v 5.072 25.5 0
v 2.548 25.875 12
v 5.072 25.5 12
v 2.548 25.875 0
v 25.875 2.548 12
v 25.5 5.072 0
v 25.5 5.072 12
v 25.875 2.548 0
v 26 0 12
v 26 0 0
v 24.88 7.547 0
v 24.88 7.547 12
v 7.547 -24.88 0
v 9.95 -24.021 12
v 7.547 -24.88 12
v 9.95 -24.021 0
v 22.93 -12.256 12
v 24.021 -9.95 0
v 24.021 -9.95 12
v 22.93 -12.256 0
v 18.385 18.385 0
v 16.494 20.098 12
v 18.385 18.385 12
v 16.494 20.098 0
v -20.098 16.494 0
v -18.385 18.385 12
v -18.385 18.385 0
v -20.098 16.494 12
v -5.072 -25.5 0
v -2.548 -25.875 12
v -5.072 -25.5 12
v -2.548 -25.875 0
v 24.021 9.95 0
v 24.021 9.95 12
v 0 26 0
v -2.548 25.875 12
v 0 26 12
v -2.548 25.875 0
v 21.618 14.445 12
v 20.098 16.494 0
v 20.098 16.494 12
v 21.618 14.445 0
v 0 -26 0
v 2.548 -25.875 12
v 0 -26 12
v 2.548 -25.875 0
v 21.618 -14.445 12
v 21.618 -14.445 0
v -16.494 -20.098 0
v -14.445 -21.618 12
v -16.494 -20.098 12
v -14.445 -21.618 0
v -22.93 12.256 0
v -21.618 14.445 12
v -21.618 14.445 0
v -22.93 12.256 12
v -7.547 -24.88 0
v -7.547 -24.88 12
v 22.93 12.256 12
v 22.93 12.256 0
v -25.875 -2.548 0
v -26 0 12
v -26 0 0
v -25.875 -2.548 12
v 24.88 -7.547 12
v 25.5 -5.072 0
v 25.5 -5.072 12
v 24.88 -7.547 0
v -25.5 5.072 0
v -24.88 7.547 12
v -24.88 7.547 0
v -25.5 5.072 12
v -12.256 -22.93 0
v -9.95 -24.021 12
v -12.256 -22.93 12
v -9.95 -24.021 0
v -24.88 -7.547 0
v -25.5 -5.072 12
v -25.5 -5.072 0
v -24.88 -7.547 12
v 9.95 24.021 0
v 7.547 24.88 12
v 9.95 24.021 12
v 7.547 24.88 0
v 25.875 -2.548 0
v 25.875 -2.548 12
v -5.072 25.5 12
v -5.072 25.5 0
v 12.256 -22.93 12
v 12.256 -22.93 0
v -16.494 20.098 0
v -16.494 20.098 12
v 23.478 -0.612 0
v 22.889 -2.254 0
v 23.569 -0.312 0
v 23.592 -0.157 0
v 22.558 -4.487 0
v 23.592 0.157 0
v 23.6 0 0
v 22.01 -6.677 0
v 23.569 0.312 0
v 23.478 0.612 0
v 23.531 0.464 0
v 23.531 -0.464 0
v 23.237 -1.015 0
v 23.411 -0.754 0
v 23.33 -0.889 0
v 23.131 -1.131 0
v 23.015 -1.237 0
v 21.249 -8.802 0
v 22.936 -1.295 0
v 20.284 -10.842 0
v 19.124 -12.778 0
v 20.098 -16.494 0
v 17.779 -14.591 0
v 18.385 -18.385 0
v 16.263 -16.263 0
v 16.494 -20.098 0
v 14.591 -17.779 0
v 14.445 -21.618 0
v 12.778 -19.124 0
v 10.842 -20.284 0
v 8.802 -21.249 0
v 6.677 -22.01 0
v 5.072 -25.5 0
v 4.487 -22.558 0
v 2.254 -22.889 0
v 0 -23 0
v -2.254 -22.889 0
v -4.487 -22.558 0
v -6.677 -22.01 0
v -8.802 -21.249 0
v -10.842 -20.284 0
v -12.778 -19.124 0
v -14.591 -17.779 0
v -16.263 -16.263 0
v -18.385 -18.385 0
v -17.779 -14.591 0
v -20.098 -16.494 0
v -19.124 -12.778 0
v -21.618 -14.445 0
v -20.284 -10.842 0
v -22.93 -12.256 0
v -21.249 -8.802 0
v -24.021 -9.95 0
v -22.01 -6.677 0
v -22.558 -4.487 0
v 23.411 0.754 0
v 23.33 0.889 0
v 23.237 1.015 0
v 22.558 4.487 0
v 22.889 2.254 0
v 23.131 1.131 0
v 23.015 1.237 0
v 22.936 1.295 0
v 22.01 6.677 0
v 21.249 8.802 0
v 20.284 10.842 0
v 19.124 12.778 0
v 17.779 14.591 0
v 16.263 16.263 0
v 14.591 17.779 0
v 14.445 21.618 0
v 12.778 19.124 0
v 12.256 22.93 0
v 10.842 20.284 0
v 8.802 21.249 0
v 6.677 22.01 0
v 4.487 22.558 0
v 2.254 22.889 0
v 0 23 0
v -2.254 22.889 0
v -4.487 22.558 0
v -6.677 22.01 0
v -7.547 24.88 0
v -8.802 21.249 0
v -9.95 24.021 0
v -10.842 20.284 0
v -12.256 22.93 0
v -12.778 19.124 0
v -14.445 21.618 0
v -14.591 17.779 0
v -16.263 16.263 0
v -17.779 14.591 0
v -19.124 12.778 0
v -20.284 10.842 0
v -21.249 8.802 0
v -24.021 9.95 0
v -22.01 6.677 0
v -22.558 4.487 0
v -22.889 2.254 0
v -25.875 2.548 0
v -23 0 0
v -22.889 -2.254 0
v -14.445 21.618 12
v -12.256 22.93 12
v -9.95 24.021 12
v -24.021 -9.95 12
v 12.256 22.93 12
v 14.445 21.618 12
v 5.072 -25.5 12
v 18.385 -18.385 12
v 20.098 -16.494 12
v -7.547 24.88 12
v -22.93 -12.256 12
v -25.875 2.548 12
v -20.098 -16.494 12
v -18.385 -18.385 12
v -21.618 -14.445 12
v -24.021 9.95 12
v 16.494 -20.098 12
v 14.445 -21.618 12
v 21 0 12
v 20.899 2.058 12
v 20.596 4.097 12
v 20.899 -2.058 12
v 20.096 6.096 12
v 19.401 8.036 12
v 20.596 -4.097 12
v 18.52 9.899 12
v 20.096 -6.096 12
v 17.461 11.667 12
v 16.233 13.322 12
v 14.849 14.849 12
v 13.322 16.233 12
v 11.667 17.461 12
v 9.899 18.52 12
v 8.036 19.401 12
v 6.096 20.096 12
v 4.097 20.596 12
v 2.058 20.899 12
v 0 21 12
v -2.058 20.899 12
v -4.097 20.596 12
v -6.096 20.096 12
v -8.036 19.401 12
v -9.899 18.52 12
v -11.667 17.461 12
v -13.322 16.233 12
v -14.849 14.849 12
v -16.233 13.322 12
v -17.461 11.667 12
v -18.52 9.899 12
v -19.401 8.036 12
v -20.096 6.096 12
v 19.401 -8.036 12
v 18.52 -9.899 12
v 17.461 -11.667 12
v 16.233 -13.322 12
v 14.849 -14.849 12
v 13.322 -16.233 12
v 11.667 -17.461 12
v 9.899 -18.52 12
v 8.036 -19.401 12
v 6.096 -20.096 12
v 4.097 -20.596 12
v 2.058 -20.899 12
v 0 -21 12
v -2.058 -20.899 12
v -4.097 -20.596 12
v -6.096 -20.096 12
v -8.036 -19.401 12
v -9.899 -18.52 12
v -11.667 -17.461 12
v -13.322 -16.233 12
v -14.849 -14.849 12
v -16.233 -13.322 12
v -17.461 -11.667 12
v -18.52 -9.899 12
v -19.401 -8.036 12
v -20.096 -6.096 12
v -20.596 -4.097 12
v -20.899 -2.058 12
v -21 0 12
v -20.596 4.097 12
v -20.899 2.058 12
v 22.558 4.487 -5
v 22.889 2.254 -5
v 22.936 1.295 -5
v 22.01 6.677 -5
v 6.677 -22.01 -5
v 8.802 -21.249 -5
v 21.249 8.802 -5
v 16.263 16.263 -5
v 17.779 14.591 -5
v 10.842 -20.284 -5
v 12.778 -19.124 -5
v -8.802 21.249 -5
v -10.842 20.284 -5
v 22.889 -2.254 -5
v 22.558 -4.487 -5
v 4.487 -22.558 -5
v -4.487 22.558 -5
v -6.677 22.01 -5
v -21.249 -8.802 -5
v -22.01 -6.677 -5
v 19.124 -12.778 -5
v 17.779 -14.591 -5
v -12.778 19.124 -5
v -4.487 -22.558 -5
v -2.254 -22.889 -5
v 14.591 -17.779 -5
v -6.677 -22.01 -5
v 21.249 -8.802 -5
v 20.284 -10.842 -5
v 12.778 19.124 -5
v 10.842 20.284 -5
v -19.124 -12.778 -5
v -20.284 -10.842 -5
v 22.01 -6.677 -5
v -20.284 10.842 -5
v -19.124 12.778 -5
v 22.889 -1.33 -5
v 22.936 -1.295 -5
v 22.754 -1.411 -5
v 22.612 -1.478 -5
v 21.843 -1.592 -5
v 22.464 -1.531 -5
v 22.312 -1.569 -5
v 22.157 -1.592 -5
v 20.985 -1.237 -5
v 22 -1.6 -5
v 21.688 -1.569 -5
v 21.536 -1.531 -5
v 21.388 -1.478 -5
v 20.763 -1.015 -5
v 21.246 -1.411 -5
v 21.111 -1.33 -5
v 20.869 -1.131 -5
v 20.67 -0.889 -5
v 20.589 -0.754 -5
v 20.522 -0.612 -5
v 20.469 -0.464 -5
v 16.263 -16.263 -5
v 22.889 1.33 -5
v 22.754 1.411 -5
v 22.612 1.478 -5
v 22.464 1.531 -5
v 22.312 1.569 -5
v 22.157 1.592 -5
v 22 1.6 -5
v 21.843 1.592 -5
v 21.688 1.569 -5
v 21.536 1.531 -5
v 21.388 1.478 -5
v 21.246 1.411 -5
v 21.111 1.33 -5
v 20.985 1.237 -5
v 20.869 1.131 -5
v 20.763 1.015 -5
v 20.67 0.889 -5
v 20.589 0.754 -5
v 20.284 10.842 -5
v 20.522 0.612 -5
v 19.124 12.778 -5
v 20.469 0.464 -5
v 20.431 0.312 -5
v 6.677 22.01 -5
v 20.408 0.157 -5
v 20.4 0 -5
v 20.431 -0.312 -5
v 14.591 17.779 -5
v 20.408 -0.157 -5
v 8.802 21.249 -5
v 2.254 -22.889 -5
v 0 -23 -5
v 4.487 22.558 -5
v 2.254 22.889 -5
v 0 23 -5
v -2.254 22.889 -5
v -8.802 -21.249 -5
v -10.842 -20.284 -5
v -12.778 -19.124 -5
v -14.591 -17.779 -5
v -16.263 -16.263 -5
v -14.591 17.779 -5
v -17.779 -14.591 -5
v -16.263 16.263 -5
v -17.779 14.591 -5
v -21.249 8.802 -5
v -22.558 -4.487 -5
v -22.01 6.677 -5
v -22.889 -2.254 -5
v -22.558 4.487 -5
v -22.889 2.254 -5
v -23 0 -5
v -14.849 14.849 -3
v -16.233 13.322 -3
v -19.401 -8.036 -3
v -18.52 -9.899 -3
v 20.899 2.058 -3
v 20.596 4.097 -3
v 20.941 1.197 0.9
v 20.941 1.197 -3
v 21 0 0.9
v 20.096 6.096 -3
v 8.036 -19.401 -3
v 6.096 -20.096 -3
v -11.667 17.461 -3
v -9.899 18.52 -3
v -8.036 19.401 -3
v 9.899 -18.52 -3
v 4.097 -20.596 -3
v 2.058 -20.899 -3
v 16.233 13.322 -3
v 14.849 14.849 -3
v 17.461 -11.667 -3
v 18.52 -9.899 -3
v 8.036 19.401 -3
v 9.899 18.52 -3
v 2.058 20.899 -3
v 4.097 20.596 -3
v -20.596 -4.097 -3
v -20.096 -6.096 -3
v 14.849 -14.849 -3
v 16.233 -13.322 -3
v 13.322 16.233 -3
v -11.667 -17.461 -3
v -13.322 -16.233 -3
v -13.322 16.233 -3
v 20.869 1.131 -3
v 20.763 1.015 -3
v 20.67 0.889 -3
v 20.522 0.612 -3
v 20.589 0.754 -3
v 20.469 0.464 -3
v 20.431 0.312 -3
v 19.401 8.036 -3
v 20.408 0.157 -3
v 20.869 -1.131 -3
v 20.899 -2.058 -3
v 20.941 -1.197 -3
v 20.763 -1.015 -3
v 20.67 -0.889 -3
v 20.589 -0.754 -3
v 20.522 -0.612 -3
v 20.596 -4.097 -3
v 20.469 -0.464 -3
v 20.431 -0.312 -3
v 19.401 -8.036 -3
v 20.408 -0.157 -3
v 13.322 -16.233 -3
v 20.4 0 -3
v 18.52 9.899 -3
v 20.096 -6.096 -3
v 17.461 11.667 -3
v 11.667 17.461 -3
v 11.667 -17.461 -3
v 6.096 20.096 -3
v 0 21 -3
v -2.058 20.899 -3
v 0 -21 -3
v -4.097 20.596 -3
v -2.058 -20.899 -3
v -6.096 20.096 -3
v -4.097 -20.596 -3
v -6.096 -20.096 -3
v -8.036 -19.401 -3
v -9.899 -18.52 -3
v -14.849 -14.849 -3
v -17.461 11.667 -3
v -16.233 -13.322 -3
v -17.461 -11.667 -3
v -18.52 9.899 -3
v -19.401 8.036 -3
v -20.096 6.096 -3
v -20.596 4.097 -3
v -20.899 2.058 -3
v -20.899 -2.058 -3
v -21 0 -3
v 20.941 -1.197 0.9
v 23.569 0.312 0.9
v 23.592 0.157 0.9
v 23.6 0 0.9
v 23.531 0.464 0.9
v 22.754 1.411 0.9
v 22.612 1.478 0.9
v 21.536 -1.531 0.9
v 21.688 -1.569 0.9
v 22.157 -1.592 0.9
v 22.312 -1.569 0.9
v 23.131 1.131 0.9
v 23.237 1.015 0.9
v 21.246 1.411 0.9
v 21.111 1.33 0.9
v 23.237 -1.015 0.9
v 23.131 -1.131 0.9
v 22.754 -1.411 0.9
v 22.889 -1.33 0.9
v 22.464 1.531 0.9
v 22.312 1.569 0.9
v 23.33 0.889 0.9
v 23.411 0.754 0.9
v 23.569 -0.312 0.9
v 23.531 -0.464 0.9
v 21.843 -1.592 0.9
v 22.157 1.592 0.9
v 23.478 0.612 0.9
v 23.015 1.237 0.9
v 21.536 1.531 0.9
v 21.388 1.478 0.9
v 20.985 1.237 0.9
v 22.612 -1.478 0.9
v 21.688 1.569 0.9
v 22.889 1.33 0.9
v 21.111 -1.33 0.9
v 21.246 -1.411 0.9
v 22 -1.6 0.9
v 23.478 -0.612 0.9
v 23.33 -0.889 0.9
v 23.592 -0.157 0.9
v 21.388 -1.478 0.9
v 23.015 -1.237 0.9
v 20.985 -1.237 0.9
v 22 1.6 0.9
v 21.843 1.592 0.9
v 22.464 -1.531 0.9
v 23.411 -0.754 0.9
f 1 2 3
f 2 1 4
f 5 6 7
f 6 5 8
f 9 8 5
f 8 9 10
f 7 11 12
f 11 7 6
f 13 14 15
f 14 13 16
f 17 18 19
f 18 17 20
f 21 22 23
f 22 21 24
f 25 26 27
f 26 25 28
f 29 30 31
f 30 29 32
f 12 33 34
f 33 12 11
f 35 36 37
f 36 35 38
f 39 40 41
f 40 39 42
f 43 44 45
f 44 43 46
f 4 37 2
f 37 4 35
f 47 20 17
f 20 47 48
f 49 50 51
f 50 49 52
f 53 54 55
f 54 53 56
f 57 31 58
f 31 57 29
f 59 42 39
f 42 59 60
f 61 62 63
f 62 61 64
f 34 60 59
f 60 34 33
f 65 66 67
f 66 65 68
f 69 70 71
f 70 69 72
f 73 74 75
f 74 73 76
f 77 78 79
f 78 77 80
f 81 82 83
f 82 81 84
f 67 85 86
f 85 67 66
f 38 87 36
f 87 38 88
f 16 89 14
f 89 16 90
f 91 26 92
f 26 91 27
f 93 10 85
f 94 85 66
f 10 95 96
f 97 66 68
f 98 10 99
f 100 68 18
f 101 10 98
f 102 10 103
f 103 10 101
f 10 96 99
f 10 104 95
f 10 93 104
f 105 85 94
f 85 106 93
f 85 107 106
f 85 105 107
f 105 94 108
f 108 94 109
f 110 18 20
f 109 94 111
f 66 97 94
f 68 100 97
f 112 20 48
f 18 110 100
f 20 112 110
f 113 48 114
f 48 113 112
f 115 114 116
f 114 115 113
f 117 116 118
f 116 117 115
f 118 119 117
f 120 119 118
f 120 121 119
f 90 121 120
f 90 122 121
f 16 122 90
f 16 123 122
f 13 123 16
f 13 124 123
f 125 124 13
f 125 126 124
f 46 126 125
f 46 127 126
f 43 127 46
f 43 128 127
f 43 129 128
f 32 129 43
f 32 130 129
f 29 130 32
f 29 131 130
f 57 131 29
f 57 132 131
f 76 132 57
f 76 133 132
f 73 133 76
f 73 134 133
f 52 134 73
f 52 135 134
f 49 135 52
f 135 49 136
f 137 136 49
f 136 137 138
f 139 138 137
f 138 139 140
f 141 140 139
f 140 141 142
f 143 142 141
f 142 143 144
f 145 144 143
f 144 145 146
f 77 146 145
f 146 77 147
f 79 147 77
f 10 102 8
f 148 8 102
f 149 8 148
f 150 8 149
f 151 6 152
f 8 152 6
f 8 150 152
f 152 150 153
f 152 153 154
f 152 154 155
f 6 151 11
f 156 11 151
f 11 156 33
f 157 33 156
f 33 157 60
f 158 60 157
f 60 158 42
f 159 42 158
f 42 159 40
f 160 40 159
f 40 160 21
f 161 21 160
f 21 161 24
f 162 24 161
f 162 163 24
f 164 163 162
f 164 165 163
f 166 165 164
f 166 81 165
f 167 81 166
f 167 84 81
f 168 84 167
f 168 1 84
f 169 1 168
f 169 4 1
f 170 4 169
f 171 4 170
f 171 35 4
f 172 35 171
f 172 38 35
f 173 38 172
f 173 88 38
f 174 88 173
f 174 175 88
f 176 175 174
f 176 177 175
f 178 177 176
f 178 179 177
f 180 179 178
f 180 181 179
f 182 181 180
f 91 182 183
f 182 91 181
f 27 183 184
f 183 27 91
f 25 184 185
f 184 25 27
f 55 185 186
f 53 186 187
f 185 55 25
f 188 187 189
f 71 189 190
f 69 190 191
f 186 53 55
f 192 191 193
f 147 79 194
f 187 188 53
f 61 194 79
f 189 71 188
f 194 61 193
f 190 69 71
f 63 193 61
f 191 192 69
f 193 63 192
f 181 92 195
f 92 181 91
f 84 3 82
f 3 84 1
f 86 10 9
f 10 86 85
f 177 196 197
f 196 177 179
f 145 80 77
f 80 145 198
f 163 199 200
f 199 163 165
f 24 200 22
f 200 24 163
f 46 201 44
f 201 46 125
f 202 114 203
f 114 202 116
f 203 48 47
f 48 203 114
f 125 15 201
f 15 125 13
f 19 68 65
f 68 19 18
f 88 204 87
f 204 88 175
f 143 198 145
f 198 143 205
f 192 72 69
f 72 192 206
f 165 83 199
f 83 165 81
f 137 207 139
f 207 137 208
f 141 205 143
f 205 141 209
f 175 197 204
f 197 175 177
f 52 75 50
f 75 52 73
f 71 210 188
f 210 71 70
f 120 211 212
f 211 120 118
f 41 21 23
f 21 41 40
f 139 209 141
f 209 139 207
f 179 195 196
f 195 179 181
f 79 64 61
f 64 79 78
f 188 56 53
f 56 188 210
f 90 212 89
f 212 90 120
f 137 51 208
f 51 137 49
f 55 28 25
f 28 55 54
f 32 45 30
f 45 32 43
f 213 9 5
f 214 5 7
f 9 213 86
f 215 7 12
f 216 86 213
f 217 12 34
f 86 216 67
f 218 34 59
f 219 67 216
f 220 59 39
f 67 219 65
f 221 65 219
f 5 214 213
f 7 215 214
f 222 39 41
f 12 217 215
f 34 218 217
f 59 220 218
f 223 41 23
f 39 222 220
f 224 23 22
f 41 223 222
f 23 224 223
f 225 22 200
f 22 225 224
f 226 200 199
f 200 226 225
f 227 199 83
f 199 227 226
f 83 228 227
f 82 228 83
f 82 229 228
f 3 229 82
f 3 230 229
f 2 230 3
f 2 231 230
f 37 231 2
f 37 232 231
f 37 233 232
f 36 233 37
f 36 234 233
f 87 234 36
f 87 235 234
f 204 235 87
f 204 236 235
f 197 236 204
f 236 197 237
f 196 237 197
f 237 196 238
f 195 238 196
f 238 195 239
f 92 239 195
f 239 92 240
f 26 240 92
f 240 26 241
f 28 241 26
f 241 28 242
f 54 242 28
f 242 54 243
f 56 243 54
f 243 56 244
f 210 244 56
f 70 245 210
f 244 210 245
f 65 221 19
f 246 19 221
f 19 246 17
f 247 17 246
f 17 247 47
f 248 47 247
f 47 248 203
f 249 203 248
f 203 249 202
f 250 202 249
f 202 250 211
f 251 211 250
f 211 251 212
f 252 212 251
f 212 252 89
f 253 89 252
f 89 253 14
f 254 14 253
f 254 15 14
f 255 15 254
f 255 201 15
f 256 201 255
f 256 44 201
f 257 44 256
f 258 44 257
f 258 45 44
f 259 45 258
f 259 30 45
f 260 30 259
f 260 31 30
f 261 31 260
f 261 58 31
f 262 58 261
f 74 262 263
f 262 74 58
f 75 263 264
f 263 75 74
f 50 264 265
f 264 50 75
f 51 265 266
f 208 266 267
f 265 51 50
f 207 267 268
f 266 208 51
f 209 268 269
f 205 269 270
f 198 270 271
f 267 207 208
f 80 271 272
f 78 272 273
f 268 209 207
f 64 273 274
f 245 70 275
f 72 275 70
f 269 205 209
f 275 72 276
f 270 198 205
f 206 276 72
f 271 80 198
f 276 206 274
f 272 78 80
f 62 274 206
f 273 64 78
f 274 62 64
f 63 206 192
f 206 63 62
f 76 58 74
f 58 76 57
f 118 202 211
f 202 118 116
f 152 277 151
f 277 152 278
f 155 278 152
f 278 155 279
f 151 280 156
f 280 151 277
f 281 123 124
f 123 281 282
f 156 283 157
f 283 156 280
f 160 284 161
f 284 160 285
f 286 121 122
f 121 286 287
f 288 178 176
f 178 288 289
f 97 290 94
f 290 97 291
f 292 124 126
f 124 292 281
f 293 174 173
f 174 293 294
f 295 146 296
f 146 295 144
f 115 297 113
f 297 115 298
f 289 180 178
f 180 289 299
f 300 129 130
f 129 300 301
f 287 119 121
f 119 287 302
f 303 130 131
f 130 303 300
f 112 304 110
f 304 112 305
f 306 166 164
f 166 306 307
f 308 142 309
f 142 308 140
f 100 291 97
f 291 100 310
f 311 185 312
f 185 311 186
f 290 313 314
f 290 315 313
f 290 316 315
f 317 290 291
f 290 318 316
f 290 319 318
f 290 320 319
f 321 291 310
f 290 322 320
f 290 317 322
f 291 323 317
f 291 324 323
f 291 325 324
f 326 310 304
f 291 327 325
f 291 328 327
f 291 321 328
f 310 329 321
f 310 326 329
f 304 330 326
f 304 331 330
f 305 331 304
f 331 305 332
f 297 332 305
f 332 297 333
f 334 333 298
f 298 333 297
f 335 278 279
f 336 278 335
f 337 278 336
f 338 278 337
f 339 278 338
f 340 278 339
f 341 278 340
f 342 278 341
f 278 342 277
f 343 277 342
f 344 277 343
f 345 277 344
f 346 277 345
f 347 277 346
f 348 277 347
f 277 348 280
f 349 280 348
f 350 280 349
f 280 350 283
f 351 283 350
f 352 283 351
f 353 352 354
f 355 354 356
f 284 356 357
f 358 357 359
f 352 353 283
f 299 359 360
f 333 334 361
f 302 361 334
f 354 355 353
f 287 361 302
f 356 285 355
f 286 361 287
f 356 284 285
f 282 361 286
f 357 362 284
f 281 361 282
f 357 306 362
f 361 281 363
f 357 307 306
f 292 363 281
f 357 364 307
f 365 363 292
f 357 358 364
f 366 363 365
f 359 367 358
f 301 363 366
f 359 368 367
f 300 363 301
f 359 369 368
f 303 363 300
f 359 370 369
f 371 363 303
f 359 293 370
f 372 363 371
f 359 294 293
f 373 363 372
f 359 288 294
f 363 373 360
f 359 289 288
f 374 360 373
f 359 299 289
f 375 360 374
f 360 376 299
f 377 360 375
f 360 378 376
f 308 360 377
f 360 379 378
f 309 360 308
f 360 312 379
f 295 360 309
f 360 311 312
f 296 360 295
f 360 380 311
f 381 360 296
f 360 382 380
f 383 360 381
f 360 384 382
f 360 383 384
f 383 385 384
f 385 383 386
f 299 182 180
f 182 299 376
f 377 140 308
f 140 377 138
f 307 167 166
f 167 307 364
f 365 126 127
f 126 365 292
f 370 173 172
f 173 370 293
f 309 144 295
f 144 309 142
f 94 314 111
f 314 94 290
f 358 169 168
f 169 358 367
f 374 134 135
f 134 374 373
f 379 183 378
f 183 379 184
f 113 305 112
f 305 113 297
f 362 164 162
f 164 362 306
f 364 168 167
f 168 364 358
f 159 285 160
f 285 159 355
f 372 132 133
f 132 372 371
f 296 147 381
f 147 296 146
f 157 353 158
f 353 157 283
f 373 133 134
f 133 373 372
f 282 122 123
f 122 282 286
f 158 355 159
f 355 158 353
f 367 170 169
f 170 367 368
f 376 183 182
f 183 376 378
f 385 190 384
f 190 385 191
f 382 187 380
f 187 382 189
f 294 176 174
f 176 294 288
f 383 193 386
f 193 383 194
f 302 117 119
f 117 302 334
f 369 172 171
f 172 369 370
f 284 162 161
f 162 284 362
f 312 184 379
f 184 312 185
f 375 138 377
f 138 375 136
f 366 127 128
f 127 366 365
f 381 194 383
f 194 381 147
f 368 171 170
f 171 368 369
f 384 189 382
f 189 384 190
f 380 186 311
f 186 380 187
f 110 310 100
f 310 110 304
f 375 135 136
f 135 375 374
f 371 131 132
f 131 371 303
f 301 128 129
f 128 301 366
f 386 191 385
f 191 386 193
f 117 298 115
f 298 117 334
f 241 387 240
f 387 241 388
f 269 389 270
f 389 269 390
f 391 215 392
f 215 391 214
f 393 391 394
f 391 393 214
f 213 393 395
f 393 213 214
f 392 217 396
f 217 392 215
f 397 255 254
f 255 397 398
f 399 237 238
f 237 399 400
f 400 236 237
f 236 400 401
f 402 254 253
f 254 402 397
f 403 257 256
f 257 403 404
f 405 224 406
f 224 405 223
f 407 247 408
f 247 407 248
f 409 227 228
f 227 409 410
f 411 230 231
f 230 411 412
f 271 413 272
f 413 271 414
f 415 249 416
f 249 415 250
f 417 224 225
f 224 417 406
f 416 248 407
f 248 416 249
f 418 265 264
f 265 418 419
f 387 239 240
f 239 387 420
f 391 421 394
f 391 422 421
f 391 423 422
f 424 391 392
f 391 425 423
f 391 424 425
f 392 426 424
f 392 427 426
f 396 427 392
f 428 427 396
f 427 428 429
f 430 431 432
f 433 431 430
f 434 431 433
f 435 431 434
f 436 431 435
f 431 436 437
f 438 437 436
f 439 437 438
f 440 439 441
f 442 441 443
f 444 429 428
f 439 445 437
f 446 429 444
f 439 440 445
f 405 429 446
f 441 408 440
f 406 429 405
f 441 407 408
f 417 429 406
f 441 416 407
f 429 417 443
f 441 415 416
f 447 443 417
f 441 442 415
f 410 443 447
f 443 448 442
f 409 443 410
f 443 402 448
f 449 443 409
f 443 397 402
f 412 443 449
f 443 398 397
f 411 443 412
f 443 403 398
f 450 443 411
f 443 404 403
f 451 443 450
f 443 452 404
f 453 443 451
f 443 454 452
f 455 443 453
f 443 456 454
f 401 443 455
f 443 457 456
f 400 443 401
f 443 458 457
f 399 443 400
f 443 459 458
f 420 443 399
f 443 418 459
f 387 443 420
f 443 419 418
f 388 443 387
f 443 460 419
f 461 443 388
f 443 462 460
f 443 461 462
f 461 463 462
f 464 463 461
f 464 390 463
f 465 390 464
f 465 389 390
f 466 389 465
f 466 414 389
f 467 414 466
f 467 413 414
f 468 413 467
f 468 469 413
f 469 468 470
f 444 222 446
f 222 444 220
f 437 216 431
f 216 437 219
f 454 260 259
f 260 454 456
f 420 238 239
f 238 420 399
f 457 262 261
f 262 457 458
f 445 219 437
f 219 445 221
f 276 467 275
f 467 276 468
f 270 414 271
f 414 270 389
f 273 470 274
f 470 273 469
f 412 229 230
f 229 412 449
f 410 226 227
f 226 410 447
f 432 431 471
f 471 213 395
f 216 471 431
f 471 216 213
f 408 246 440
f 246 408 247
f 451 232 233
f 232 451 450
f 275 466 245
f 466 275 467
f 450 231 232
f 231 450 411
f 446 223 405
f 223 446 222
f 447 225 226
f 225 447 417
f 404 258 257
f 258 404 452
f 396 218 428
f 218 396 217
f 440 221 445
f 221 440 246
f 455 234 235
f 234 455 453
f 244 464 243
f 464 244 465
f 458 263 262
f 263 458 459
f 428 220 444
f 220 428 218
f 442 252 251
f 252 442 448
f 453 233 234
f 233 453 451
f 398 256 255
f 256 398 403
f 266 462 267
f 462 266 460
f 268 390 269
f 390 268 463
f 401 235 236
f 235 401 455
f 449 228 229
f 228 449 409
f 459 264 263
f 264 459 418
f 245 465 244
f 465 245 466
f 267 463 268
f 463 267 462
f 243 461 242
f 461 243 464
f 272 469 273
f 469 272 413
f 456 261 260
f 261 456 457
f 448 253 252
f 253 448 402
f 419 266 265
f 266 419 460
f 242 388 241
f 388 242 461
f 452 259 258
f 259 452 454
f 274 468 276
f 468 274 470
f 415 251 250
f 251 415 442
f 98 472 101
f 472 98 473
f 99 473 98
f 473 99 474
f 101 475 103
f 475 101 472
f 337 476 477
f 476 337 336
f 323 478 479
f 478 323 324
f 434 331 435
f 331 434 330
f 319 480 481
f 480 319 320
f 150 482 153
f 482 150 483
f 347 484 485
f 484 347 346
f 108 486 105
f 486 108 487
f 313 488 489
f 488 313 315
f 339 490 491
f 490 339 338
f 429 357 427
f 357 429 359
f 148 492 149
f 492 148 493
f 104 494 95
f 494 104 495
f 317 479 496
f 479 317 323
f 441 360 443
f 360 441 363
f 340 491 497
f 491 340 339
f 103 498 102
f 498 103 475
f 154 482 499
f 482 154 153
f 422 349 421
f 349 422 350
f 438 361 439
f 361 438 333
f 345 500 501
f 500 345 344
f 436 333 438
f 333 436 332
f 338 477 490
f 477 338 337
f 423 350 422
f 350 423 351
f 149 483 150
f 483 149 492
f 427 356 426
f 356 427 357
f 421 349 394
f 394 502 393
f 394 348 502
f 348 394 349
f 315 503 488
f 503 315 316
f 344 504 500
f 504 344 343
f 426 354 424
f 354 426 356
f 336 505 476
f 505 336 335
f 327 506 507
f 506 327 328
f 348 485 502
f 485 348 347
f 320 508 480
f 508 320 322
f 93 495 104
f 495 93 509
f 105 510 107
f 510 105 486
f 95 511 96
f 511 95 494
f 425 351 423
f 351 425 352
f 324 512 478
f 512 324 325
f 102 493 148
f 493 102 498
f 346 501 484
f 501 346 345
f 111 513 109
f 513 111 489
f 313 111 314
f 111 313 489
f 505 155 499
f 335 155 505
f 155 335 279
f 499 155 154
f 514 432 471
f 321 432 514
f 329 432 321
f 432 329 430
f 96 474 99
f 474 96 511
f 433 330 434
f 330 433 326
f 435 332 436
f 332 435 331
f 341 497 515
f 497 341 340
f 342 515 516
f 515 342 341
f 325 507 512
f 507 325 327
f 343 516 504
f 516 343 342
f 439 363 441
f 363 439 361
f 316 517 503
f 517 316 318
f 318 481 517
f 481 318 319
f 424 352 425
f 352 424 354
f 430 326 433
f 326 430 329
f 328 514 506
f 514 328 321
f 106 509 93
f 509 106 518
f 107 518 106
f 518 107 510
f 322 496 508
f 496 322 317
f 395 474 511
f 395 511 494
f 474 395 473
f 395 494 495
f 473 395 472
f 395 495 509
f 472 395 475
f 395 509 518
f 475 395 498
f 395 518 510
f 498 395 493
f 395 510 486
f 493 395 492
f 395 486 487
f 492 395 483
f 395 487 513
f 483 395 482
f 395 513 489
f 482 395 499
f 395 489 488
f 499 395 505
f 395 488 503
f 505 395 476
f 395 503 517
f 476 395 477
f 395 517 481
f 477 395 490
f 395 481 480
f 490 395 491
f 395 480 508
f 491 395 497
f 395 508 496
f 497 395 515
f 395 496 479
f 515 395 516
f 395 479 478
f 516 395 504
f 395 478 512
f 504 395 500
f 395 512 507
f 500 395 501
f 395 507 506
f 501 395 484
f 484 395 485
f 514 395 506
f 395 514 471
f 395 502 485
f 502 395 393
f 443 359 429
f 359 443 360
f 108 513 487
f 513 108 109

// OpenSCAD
// file: ../../sorgenti/parametri.scad
// ============================================================
// parametri.scad — tutte le misure del progetto, in millimetri
// ------------------------------------------------------------
// Unica fonte di verità per la geometria: se cambia un
// componente, si cambia QUI e si rigenerano gli STL con
//   ./modelli-3d/genera-stl.sh
//
// Le misure marcate [VERIFICARE] vanno ricontrollate col
// calibro quando arrivano i pezzi, prima di stampare il case.
// ============================================================

// Risoluzione delle curve: 48 per lavorare, 96 per gli STL finali.
RISOLUZIONE = 64;

// ---------- Tolleranze di stampa (Kobra S2 / S3 Max, ugello 0,4) ----------
GIOCO        = 0.35;  // gioco fra due pezzi stampati che si accoppiano
GIOCO_FORO   = 0.25;  // sovramisura dei fori per i componenti
PARETE_MIN   = 1.6;   // spessore minimo di una parete portante (4 linee)

// ---------- Scocca ----------
// Scocca = pareti + coperchio in UN SOLO pezzo (si stampa capovolta).
// Il fondo è una piastra separata, avvitata dall'esterno.
BOX_X        = 130;   // larghezza
BOX_Y        = 130;   // profondità
BOX_Z        = 100;   // altezza totale, fondo compreso
PARETE       = 2.4;   // spessore pareti (3 perimetri a 0,8)
TOP_SP       = 5.0;   // spessore del coperchio (serve per il dado del tasto arcade)
RAGGIO_VERT  = 8;     // raggio degli angoli verticali (spec: >= 5)
RAGGIO_TOP   = 3;     // raccordo del bordo superiore
FONDO_SP     = 3.0;   // spessore della piastra di fondo
FONDO_INCASSO = FONDO_SP;  // il fondo è incassato e a filo con le pareti

// ---------- Zona NFC sul coperchio ----------
NFC_D        = 62;    // diametro dello scasso di appoggio
NFC_PROF     = 3.0;   // profondità dello scasso
NFC_X        = 0;     // posizione del centro (X=0 = centro scatola)
NFC_Y        = 28;    // spostato verso il retro, davanti ci stanno i comandi
NFC_TACCA_D  = 14;    // tacche laterali per sollevare il vinile con un dito
// Fondo dello scasso = TOP_SP - NFC_PROF = 2,0 mm (limite di specifica)

// ---------- Cursore volume (potenziometro a slitta B10K) ----------
CURSORE_CORSA   = 60;    // corsa utile [VERIFICARE sul pezzo]
CURSORE_LUNG    = 75;    // lunghezza totale del corpo [VERIFICARE]
CURSORE_LARG    = 9;     // larghezza del corpo [VERIFICARE]
CURSORE_ALT     = 9;     // altezza del corpo sopra il PCB [VERIFICARE]
CURSORE_LEVA_X  = 2.0;   // spessore della levetta
CURSORE_LEVA_Y  = 6.0;   // larghezza della levetta
CURSORE_FESSURA_W = 3.2; // larghezza della fessura nel coperchio
CURSORE_Y       = -16;   // posizione sul coperchio
CURSORE_Z_SOTTO = 7;     // quota del corpo del potenziometro sotto la faccia interna

// ---------- Tasti arcade ----------
// "30 mm" è il diametro del cappuccio: il foro di montaggio è 28 mm
// sui modelli con ghiera filettata. [VERIFICARE col pezzo in mano]
TASTO_FORO   = 28.0;
TASTO_CAPPUCCIO = 33;
TASTO_X      = 35;    // centri a +/- 35 -> 70 mm fra i centri
TASTO_Y      = -42;

// ---------- Display e-paper 2,13" (Waveshare 250x122) ----------
EPD_PCB_X    = 59.2;  // [VERIFICARE]
EPD_PCB_Z    = 29.2;  // [VERIFICARE]
EPD_PCB_SP   = 1.2;   // spessore del modulo senza componenti
EPD_FIN_X    = 50;    // finestra visibile (area attiva 48,55 x 23,7)
EPD_FIN_Z    = 25.5;
EPD_Z        = 76;    // quota del centro finestra sulla parete frontale
EPD_PARETE   = 1.2;   // parete sottile davanti al display (0 = finestra aperta)

// ---------- Altoparlante ----------
ALT_D        = 40;    // diametro esterno [VERIFICARE]
ALT_ALT      = 6;     // altezza col magnete [VERIFICARE]
ALT_Z        = 32;    // quota del centro sulla parete frontale
ALT_GRIGLIA_D   = 1.8; // fori della griglia (spec: <= 2 mm)
ALT_CAMERA_PROF = 12;  // profondità della camera chiusa dietro il cono
ALT_TUBO_OD     = 52;  // diametro esterno del tubo portaltoparlante
ALT_TUBO_LUNG   = 12;  // lunghezza del tubo verso l'interno
ALT_CAMERA_SEDE = 46.4;// controforo in cui si innesta la camera

// ---------- Lettore PN5180 ----------
// Fissato sotto il coperchio con biadesivo + nervature di contenimento.
// Le nervature sono aperte su un lato: il modulo entra a scorrere.
PN_X         = 58;    // ingombro del modulo, lato X [VERIFICARE]
PN_Y         = 47;    // ingombro del modulo, lato Y [VERIFICARE]
PN_ALT       = 8;     // altezza totale coi componenti [VERIFICARE]

// ---------- Retro: USB-C e microSD ----------
USB_X        = -28;   // posizione del centro sulla parete di fondo
USB_Z        = 18;
USB_W        = 11.0;  // foro per il connettore USB-C del TP4056
USB_H        = 6.0;
SD_X         = 28;
SD_Z         = 18;
SD_W         = 14.0;  // fessura di inserimento della microSD
SD_H         = 3.4;

// ---------- Fondo: interruttore, tasto genitori, vano batteria ----------
SW_X         = -40;   // interruttore a slitta da pannello
SW_Y         = -53;
SW_FORO_X    = 13.0;  // [VERIFICARE: SS12D00 o simile]
SW_FORO_Y    = 8.0;
SW_VITI      = 19.5;  // distanza fra le due viti di fissaggio
SW_INCASSO   = 1.6;   // incasso per non sporgere dal fondo

GEN_X        = 40;    // tasto genitori (tattile 6 mm), incassato
GEN_Y        = -53;
GEN_FORO_D   = 6.0;   // passa un polpastrello adulto, non la mano di un bimbo
GEN_POZZO_D  = 11;    // pozzetto di incasso
GEN_POZZO_H  = 1.8;

// Portabatteria con l'asse lungo su Y, sul lato destro: la basetta
// millefori gli passa sopra senza toccarlo.
BATT_HOLDER_X = 24;   // larghezza [VERIFICARE]
BATT_HOLDER_Y = 78;   // lunghezza [VERIFICARE]
BATT_HOLDER_Z = 20;
BATT_X        = 24;   // centro del vano batteria
BATT_Y        = 0;
SPORT_X       = 26;   // apertura dello sportellino batteria
SPORT_Y       = 72;
SPORT_PIASTRA_X = 40; // piastrina dello sportellino
SPORT_PIASTRA_Y = 82;
SPORT_SP      = 2.5;  // spessore dello sportellino
SPORT_RABBET  = 1.2;  // incasso dello sportellino (resta a filo)
SPORT_VITI_DX = 14;   // viti dello sportellino, scostamento da BATT_X
SPORT_VITI_DY = 36;
AUTOFIL_D     = 2.1;  // preforo per vite autofilettante M2,5 nel PETG

// ---------- Viti e inserti ----------
VITE_D       = 2.5;        // M2,5
VITE_FORO    = 2.8;        // passaggio della vite
VITE_TESTA_D = 5.0;        // svasatura della testa
INSERTO_D    = 3.6;        // inserto a caldo M2,5 [VERIFICARE col lotto]
INSERTO_H    = 5.0;
BOSS_D       = 7.5;        // diametro del pilastrino che ospita l'inserto
BOSS_OFF     = 6;          // distanza del pilastrino dalla parete interna

// ---------- Elettronica interna ----------
MILLEFORI_X  = 90;    // basetta millefori (90 x 70)
MILLEFORI_Y  = 70;
MILLEFORI_Z  = 28;    // quota della basetta sopra il fondo
MILLEFORI_SP = 1.6;
MILLEFORI_VITI_X = 41; // colonnine di sostegno
MILLEFORI_VITI_Y = 31;

// ---------- Statuine ----------
ST_BASE_D    = 40;    // cilindro di base
ST_BASE_H    = 8;
ST_TAG_D     = 25;    // tag NTAG213 adesivo
ST_TAG_SEDE_D = 26.4; // sede del tag, con gioco
ST_TAG_SEDE_H = 1.0;  // profondità della sede
ST_TAG_FONDO = 1.0;   // spessore sotto il tag (spec: 1 mm dal fondo)
ST_SMUSSO    = 1.5;   // smusso del bordo della base

// ---------- Vinili ----------
VIN_D        = 60;
VIN_H        = 4;
VIN_SOLCO_H  = 0.4;   // rilievo dei solchi
VIN_ETICH_D  = 24;    // etichetta centrale
VIN_RAGGIO   = 1.2;   // raccordo del bordo

// ---------- Calibro parti piccole (EN 71-1) ----------
CAL_D        = 31.7;
CAL_H_MIN    = 25.4;
CAL_H_MAX    = 57.1;
// file: ../../sorgenti/libreria.scad
// ============================================================
// libreria.scad — forme di base riusate da tutti i pezzi
// ============================================================
include <parametri.scad>

$fn = RISOLUZIONE;

// Prisma a sezione rettangolare con angoli arrotondati.
module piastra(x, y, h, r) {
    linear_extrude(height = h)
        offset(r = r) square([x - 2*r, y - 2*r], center = true);
}

// Scatola piena con angoli verticali arrotondati (rv) e bordo
// superiore raccordato (rt). Il raccordo è approssimato a gradini
// uniti con hull(): resta liscio e si stampa senza supporti.
module scatola_arrotondata(x, y, z, rv, rt, passi = 12) {
    union() {
        piastra(x, y, z - rt, rv);
        for (i = [0 : passi - 1]) {
            a0 = 90 * i / passi;
            a1 = 90 * (i + 1) / passi;
            k0 = rt * (1 - cos(a0));  k1 = rt * (1 - cos(a1));
            h0 = rt * sin(a0);        h1 = rt * sin(a1);
            hull() {
                translate([0, 0, z - rt + h0])
                    piastra(x - 2*k0, y - 2*k0, 0.02, max(rv - k0, 0.6));
                translate([0, 0, z - rt + h1])
                    piastra(x - 2*k1, y - 2*k1, 0.02, max(rv - k1, 0.6));
            }
        }
    }
}

// Foro di passaggio per vite con svasatura della testa (testa in basso,
// si avvita dal basso verso l'alto).
module foro_svasato(h = 10, d = VITE_FORO, testa_d = VITE_TESTA_D, testa_h = 1.6) {
    translate([0, 0, -0.1]) cylinder(h = h + 0.2, d = d);
    translate([0, 0, -0.1]) cylinder(h = testa_h + 0.1, d1 = testa_d, d2 = d);
}

// Pilastrino con sede per inserto a caldo M2,5 (si inserisce dal basso).
module boss_inserto(h = 12, d = BOSS_D) {
    difference() {
        cylinder(h = h, d = d);
        translate([0, 0, -0.1]) cylinder(h = INSERTO_H + 0.1, d = INSERTO_D);
        // scarico sopra l'inserto, per la punta della vite
        translate([0, 0, INSERTO_H]) cylinder(h = h, d = VITE_D + 0.4);
    }
}

// Griglia di fori a nido d'ape dentro un cerchio di diametro d_area.
module griglia_tonda(d_area, spessore, d_foro = ALT_GRIGLIA_D, passo = 3.2) {
    n = ceil(d_area / passo) + 2;
    for (i = [-n : n], j = [-n : n]) {
        x = i * passo + (abs(j) % 2) * passo / 2;
        y = j * passo * 0.866;
        if (sqrt(x*x + y*y) <= (d_area - d_foro) / 2)
            translate([x, y, -0.1]) cylinder(h = spessore + 0.2, d = d_foro);
    }
}

// Fessura allungata (slot) con estremi arrotondati, asse X.
module fessura(lung, larg, h) {
    hull() {
        translate([-(lung - larg)/2, 0, 0]) cylinder(h = h, d = larg);
        translate([ (lung - larg)/2, 0, 0]) cylinder(h = h, d = larg);
    }
}

// Scritta in rilievo (per i provini e le etichette).
module scritta(t, dim = 6, alt = 0.6) {
    linear_extrude(height = alt)
        text(t, size = dim, halign = "center", valign = "center",
             font = "Helvetica:style=Bold");
}

// Freccia piena, punta verso +X, usata per le icone dei tasti.
module freccia(lung = 16, larg = 14, alt = 0.8) {
    gambo = larg / 5;          // mezza larghezza del gambo
    testa = lung * 0.45;       // lunghezza della punta
    linear_extrude(height = alt)
        polygon([[-lung/2, -gambo], [lung/2 - testa, -gambo],
                 [lung/2 - testa, -larg/2], [lung/2, 0],
                 [lung/2 - testa, larg/2], [lung/2 - testa, gambo],
                 [-lung/2, gambo]]);
}

// Icona "volume": tre barrette crescenti, asse X.
module icona_volume(n = 3, alt = 0.8, passo = 3.2, base = 2.0, cresc = 1.6) {
    for (i = [0 : n - 1])
        translate([i * passo, 0, 0])
            linear_extrude(height = alt)
                square([1.8, base + i * cresc], center = true);
}

// Cava a sezione rettangolare arrotondata, asse di estrusione Y.
// Utile per finestre e fessure nelle pareti verticali.
module cava_y(x, z, prof, r = 1.5) {
    rotate([90, 0, 0])
        linear_extrude(height = prof, center = true)
            offset(r = r) square([x - 2*r, z - 2*r], center = true);
}

// Pilastrino che parte dal piano del fondo e ospita un inserto a caldo
// (inserito dal basso). La punta conica in alto lo rende stampabile
// anche a scatola capovolta.
module boss_fondo(h = 12) {
    union() {
        difference() {
            cylinder(h = h, d = BOSS_D);
            translate([0, 0, -0.1]) cylinder(h = INSERTO_H + 0.1, d = INSERTO_D);
            translate([0, 0, INSERTO_H]) cylinder(h = h, d = VITE_D + 0.6);
        }
        translate([0, 0, h]) cylinder(h = BOSS_D/2, d1 = BOSS_D, d2 = 0.4);
    }
}

// Pilastrino appeso al soffitto (coperchio): l'inserto entra dal basso.
module boss_soffitto(h = 7) {
    difference() {
        translate([0, 0, -h]) cylinder(h = h, d = BOSS_D);
        translate([0, 0, -h - 0.1]) cylinder(h = INSERTO_H + 0.1, d = INSERTO_D);
    }
}
// main file
// ============================================================
// camera-altoparlante.scad — camera chiusa dietro il cono
// ------------------------------------------------------------
// Si innesta nel controforo del tubo portaltoparlante: blocca
// l'altoparlante contro la parete, chiude la camera acustica e
// tiene il magnete lontano dall'antenna NFC.
// Incollare con silicone o colla a caldo (serve tenuta d'aria).
//
// STAMPA: fondo chiuso sul piano, apertura verso l'alto.
// ============================================================
include <../../sorgenti/libreria.scad>

camera();

INNESTO_D = ALT_CAMERA_SEDE - 0.4;
INNESTO_H = 5;
PARETE_C  = 2;

module camera() {
    difference() {
        union() {
            // corpo della camera
            cylinder(h = ALT_CAMERA_PROF, d = ALT_TUBO_OD);
            // innesto nel controforo del tubo
            translate([0, 0, -INNESTO_H])
                cylinder(h = INNESTO_H + 0.1, d = INNESTO_D);
        }
        // volume interno
        translate([0, 0, -INNESTO_H + PARETE_C])
            cylinder(h = ALT_CAMERA_PROF + INNESTO_H, d = INNESTO_D - 2*PARETE_C);
        // passaggio dei due fili, sul bordo dell'innesto
        translate([INNESTO_D/2 - 1, 0, -INNESTO_H - 0.1])
            cylinder(h = INNESTO_H + 1, d = 3.2);
    }
}
